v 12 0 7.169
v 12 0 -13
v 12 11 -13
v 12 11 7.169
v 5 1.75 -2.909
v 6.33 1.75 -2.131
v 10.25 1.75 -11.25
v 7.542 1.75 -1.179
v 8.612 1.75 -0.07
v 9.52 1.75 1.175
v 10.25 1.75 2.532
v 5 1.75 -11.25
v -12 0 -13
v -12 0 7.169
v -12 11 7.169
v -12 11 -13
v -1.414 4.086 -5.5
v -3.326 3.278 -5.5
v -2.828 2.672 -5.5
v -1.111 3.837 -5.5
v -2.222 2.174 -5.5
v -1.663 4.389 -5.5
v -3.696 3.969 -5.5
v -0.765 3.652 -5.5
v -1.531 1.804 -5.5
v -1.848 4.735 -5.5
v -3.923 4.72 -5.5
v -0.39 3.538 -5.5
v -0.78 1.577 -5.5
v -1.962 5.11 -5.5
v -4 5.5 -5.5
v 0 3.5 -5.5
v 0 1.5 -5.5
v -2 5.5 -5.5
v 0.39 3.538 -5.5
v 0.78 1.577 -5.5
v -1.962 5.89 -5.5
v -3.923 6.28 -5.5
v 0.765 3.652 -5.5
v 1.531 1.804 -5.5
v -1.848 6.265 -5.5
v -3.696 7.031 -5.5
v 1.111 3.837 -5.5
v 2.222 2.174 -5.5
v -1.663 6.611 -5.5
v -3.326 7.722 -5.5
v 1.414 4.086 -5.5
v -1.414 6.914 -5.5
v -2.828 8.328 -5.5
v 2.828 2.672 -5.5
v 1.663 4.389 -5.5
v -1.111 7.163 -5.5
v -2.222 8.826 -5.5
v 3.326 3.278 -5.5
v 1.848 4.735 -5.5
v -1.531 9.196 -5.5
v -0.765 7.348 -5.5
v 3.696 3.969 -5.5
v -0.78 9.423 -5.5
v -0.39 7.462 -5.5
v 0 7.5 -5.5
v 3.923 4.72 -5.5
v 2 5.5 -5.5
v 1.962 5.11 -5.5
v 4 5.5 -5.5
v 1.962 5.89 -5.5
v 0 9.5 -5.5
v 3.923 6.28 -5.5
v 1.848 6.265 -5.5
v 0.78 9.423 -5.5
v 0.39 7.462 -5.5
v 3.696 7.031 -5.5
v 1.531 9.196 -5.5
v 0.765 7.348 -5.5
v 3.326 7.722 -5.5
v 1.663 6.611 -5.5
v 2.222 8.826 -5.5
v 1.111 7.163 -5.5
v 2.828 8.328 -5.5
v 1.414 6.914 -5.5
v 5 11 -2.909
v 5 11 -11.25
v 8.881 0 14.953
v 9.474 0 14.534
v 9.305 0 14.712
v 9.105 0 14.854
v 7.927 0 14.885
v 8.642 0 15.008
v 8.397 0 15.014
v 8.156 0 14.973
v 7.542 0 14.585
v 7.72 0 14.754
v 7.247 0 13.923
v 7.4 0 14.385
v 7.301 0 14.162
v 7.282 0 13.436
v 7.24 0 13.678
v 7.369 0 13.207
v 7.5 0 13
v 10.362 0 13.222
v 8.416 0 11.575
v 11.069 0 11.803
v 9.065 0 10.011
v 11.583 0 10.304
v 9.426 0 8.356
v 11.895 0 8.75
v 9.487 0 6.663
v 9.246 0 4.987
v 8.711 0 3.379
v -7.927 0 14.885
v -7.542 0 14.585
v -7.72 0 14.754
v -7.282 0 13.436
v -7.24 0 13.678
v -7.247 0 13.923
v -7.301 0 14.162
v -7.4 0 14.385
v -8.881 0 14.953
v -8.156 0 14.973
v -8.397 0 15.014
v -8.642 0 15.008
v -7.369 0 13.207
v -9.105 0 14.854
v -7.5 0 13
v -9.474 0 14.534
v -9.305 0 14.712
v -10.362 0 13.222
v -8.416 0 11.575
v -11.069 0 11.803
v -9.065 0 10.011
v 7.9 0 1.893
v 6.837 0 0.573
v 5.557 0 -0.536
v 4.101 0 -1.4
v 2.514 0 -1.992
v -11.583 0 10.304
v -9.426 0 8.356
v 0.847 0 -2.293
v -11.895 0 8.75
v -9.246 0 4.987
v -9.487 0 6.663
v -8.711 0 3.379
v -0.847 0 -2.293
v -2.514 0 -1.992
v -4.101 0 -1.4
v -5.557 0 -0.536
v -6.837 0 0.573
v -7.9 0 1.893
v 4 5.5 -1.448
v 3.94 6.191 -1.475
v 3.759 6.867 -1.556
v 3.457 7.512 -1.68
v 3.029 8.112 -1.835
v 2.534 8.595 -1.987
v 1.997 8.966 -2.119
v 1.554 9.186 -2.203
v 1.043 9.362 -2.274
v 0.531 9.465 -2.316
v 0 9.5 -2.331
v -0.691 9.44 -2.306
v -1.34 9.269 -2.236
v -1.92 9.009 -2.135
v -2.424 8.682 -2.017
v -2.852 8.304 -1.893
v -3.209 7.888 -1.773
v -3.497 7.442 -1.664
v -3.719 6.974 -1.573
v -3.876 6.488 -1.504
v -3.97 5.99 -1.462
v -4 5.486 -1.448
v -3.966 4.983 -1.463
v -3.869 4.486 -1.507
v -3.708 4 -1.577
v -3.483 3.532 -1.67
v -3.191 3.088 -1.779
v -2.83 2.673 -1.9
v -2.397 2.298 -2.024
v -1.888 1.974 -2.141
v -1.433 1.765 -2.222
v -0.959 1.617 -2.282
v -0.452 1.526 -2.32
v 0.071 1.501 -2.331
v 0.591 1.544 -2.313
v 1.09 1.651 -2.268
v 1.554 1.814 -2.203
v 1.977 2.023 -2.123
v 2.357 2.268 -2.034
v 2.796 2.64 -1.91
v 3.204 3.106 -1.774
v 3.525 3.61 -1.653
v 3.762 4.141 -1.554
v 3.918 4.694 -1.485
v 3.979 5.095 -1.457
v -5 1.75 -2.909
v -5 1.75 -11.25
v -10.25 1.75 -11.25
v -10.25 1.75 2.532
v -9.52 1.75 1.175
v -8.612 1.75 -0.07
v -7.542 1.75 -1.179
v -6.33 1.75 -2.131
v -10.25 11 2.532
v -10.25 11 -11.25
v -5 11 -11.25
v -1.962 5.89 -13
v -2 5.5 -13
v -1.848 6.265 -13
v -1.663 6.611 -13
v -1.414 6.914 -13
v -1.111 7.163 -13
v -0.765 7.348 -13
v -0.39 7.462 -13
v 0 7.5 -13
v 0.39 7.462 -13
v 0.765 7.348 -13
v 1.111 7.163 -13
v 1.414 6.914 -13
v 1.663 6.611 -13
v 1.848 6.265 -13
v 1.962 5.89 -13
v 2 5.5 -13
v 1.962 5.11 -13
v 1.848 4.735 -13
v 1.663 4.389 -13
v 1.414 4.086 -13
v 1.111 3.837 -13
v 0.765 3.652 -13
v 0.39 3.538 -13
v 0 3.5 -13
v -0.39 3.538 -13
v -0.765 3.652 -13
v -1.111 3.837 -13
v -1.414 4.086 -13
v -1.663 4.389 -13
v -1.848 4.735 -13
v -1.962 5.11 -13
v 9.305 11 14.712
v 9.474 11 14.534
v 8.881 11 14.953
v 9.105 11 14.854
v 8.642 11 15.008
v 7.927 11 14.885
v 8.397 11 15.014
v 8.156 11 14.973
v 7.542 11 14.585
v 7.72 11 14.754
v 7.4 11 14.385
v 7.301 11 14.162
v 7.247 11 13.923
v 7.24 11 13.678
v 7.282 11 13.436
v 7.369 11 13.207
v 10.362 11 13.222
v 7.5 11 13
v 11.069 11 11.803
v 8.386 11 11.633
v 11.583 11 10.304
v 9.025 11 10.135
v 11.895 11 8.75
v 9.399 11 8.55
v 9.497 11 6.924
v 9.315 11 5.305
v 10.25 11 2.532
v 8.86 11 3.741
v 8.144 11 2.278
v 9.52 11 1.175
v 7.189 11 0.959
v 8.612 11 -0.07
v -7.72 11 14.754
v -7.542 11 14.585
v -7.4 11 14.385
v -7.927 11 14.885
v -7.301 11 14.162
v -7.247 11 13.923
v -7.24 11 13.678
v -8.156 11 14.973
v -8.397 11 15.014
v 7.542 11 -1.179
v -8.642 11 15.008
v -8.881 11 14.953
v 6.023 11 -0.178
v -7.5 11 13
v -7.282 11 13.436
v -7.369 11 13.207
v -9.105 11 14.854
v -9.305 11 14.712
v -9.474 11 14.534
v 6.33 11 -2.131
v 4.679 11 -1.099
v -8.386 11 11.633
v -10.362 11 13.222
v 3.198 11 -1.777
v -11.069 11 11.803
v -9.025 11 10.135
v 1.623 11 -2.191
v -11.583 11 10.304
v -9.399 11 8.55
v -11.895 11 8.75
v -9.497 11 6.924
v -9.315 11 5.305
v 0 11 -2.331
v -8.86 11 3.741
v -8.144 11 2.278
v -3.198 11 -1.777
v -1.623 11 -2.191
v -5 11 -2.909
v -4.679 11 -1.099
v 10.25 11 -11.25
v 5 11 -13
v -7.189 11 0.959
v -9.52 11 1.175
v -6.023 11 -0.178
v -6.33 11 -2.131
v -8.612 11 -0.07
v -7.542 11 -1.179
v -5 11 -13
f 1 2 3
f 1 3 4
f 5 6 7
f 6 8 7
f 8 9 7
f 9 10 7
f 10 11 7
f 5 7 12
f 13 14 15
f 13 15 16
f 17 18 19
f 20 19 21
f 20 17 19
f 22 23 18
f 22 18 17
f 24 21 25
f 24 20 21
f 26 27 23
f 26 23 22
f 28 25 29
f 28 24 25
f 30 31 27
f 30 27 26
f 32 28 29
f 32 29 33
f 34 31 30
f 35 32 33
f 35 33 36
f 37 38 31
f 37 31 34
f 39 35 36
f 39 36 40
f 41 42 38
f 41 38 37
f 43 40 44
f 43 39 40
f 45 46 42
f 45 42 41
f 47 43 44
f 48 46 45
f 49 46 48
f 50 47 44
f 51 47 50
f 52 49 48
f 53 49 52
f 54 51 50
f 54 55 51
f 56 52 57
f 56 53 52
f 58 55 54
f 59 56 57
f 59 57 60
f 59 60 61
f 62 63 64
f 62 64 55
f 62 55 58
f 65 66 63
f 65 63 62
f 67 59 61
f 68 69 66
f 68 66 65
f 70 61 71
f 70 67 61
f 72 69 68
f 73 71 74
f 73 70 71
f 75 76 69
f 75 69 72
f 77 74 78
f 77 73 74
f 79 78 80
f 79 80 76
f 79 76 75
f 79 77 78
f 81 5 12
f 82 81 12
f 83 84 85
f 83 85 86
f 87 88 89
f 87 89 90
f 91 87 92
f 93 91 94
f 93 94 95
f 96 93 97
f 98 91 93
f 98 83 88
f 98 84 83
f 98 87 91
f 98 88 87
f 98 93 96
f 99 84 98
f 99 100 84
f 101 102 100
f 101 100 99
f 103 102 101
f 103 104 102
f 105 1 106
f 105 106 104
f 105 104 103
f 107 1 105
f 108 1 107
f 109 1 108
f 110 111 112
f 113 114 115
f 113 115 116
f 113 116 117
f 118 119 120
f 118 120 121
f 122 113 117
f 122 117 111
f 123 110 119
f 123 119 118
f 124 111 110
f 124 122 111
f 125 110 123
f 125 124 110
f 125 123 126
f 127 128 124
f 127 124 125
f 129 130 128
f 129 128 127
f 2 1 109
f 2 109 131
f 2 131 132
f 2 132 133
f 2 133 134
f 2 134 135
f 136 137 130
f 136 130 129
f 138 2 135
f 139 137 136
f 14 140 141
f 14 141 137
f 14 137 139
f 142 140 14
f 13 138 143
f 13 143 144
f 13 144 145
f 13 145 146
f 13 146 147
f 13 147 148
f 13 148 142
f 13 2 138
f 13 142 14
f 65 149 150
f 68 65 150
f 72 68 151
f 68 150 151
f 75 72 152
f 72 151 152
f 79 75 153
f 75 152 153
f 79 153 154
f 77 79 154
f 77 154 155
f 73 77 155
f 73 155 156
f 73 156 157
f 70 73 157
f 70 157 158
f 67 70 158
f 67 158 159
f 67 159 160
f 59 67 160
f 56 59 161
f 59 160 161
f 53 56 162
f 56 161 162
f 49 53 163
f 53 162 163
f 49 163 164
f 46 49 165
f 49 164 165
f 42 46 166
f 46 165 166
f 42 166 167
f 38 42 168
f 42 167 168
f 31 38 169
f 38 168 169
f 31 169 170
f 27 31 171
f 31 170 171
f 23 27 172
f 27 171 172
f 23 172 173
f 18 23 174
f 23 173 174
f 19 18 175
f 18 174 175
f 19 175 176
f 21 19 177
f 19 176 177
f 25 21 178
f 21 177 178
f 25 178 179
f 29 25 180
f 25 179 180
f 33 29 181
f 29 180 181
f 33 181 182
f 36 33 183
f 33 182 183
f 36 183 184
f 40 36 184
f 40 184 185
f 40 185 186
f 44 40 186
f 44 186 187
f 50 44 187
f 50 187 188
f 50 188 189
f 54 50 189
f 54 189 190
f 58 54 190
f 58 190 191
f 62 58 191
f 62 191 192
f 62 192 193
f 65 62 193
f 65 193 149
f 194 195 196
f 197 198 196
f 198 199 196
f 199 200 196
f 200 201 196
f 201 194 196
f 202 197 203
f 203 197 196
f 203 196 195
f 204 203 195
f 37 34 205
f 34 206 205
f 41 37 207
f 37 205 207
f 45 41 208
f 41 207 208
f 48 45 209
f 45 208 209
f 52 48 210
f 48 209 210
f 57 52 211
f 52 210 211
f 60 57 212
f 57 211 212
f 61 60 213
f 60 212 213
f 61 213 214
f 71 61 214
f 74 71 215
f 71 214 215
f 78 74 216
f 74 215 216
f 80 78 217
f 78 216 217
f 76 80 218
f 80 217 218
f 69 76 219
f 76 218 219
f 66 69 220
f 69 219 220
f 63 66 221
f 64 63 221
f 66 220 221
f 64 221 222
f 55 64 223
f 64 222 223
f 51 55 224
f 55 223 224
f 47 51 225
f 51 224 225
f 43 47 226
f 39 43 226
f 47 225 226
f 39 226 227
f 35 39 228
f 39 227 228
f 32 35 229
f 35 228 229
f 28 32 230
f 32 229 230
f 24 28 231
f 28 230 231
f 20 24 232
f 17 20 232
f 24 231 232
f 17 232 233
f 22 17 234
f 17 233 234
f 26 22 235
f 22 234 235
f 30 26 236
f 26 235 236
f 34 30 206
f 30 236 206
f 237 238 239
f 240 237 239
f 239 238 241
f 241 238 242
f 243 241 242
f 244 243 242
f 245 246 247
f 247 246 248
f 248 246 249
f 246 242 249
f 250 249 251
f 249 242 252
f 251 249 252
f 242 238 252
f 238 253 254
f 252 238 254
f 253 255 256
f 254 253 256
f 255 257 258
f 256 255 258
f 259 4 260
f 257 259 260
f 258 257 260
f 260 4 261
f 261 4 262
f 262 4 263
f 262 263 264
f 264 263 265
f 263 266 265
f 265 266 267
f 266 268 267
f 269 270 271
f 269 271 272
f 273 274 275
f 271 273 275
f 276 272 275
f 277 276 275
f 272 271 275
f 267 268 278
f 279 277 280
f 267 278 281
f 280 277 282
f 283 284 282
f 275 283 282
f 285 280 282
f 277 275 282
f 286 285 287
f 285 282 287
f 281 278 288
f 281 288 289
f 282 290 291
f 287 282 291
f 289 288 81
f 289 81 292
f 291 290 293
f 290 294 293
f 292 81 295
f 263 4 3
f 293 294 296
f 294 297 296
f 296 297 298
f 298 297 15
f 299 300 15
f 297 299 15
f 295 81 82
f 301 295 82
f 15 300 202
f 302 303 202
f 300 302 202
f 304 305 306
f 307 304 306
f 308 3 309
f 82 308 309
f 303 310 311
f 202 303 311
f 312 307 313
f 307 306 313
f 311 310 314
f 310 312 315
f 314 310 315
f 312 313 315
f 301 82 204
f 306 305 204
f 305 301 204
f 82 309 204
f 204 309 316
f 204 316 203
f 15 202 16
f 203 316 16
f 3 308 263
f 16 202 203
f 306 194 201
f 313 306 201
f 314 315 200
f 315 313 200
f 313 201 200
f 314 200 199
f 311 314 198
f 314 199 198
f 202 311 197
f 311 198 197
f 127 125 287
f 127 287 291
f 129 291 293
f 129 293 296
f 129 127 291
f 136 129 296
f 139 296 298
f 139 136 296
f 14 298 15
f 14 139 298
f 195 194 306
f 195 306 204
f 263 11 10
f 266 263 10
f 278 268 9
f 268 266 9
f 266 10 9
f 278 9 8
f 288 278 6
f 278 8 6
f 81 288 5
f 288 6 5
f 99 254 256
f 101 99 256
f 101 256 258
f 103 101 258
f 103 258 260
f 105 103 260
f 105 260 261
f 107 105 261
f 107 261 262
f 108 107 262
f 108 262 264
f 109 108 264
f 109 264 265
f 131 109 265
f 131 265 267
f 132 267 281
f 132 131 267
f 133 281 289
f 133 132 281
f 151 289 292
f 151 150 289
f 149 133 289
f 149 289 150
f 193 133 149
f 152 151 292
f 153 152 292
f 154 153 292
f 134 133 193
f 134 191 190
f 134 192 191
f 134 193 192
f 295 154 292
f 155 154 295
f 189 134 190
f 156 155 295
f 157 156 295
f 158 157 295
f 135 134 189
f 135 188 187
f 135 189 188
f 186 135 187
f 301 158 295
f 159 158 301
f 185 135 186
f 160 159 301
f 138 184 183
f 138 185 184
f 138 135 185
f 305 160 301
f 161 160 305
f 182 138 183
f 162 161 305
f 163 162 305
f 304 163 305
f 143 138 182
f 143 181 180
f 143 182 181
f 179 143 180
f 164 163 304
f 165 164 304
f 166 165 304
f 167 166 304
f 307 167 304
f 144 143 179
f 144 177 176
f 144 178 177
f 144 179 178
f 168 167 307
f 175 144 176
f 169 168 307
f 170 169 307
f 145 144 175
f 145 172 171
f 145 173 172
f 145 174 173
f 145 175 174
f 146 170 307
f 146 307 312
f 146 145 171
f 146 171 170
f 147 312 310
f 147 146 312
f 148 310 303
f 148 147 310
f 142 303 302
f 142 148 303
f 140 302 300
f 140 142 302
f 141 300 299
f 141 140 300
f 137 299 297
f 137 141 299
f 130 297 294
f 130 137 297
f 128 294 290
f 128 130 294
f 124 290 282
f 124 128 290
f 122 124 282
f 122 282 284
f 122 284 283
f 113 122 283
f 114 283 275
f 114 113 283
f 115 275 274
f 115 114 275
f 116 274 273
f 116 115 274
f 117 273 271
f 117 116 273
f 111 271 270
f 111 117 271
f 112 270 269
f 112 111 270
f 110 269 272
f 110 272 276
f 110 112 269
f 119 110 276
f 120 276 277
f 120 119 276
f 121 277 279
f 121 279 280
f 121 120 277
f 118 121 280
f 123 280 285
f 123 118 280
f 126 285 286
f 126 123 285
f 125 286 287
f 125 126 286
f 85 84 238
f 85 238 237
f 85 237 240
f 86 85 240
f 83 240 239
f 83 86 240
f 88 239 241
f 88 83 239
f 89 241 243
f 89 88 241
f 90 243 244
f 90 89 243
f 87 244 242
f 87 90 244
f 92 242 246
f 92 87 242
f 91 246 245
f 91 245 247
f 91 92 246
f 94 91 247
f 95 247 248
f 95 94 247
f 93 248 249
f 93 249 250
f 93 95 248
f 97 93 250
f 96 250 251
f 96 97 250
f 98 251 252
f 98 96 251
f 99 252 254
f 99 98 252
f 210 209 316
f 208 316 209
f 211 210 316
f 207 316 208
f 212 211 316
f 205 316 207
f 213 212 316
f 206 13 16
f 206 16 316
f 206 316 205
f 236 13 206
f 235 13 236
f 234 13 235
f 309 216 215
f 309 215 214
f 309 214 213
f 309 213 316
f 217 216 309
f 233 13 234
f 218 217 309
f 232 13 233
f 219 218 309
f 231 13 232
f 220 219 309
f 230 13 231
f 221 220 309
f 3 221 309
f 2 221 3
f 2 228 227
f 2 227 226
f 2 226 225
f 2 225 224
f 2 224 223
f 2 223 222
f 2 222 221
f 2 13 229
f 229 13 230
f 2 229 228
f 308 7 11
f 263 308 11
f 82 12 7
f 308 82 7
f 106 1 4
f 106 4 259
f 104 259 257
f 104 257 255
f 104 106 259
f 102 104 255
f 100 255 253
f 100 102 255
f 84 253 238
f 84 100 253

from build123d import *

# Parameters (mm, degrees)
BOSS_EXTRUDE1_DEPTH = 11
SHELL2_T            = -1.75
SKETCH5_W           = 10
SKETCH5_H           = 10.669048105
BOSS_EXTRUDE2_DEPTH = 9.25
HOLE4_D             = 4
HOLE4_DEPTH         = 13
HOLE4_CBORE_D       = 8
HOLE4_CBORE_DEPTH   = 5.5
HOLE4_TIP           = 1.201721238


with BuildPart() as part:
    # Sketch1 → Boss-Extrude1 (new body)
    with BuildSketch(Plane(origin=(0, 0, 0), x_dir=(1, 0, 0), z_dir=(0, 1, 0))):
        with BuildLine():
            Line((-12, -7.169048105), (-12, 13))
            Line((-12, 13), (12, 13))
            Line((12, 13), (12, -7.169048105))
            ThreePointArc((12, -7.169048105), (11.350863635, -11.062362212), (9.473684211, -14.534461025))
            ThreePointArc((9.473684211, -14.534461025), (7.719611593, -14.754072618), (7.5, -13))
            ThreePointArc((7.5, -13), (0, 2.330951895), (-7.5, -13))
            ThreePointArc((-7.5, -13), (-7.719611593, -14.754072618), (-9.473684211, -14.534461025))
            ThreePointArc((-9.473684211, -14.534461025), (-11.350863635, -11.062362212), (-12, -7.169048105))
        make_face()
    extrude(amount=BOSS_EXTRUDE1_DEPTH)

    # Shell2
    shell2_openings = [part.faces().sort_by_distance(p)[0] for p in [
        (0, 11, -3.682863913),
    ]]
    offset(amount=SHELL2_T, openings=shell2_openings, kind=Kind.INTERSECTION)

    # Sketch5 → Boss-Extrude2 (add)
    with BuildSketch(Plane(origin=(0, 11, 0), x_dir=(1, 0, 0), z_dir=(0, 1, 0))):
        with Locations((0, 7.665475948)):
            Rectangle(SKETCH5_W, SKETCH5_H)
    extrude(amount=-BOSS_EXTRUDE2_DEPTH)

    # Hole4
    with Locations(Plane.XY):
        with Locations((0, 5.5)):
            CounterBoreHole(HOLE4_D / 2, HOLE4_CBORE_D / 2, HOLE4_CBORE_DEPTH, depth=HOLE4_DEPTH)
            with Locations((0, 0, -(HOLE4_DEPTH + HOLE4_TIP / 2))):  # 118° drill point
                Cone(0, HOLE4_D / 2, HOLE4_TIP, mode=Mode.SUBTRACT)


solid = part.part
